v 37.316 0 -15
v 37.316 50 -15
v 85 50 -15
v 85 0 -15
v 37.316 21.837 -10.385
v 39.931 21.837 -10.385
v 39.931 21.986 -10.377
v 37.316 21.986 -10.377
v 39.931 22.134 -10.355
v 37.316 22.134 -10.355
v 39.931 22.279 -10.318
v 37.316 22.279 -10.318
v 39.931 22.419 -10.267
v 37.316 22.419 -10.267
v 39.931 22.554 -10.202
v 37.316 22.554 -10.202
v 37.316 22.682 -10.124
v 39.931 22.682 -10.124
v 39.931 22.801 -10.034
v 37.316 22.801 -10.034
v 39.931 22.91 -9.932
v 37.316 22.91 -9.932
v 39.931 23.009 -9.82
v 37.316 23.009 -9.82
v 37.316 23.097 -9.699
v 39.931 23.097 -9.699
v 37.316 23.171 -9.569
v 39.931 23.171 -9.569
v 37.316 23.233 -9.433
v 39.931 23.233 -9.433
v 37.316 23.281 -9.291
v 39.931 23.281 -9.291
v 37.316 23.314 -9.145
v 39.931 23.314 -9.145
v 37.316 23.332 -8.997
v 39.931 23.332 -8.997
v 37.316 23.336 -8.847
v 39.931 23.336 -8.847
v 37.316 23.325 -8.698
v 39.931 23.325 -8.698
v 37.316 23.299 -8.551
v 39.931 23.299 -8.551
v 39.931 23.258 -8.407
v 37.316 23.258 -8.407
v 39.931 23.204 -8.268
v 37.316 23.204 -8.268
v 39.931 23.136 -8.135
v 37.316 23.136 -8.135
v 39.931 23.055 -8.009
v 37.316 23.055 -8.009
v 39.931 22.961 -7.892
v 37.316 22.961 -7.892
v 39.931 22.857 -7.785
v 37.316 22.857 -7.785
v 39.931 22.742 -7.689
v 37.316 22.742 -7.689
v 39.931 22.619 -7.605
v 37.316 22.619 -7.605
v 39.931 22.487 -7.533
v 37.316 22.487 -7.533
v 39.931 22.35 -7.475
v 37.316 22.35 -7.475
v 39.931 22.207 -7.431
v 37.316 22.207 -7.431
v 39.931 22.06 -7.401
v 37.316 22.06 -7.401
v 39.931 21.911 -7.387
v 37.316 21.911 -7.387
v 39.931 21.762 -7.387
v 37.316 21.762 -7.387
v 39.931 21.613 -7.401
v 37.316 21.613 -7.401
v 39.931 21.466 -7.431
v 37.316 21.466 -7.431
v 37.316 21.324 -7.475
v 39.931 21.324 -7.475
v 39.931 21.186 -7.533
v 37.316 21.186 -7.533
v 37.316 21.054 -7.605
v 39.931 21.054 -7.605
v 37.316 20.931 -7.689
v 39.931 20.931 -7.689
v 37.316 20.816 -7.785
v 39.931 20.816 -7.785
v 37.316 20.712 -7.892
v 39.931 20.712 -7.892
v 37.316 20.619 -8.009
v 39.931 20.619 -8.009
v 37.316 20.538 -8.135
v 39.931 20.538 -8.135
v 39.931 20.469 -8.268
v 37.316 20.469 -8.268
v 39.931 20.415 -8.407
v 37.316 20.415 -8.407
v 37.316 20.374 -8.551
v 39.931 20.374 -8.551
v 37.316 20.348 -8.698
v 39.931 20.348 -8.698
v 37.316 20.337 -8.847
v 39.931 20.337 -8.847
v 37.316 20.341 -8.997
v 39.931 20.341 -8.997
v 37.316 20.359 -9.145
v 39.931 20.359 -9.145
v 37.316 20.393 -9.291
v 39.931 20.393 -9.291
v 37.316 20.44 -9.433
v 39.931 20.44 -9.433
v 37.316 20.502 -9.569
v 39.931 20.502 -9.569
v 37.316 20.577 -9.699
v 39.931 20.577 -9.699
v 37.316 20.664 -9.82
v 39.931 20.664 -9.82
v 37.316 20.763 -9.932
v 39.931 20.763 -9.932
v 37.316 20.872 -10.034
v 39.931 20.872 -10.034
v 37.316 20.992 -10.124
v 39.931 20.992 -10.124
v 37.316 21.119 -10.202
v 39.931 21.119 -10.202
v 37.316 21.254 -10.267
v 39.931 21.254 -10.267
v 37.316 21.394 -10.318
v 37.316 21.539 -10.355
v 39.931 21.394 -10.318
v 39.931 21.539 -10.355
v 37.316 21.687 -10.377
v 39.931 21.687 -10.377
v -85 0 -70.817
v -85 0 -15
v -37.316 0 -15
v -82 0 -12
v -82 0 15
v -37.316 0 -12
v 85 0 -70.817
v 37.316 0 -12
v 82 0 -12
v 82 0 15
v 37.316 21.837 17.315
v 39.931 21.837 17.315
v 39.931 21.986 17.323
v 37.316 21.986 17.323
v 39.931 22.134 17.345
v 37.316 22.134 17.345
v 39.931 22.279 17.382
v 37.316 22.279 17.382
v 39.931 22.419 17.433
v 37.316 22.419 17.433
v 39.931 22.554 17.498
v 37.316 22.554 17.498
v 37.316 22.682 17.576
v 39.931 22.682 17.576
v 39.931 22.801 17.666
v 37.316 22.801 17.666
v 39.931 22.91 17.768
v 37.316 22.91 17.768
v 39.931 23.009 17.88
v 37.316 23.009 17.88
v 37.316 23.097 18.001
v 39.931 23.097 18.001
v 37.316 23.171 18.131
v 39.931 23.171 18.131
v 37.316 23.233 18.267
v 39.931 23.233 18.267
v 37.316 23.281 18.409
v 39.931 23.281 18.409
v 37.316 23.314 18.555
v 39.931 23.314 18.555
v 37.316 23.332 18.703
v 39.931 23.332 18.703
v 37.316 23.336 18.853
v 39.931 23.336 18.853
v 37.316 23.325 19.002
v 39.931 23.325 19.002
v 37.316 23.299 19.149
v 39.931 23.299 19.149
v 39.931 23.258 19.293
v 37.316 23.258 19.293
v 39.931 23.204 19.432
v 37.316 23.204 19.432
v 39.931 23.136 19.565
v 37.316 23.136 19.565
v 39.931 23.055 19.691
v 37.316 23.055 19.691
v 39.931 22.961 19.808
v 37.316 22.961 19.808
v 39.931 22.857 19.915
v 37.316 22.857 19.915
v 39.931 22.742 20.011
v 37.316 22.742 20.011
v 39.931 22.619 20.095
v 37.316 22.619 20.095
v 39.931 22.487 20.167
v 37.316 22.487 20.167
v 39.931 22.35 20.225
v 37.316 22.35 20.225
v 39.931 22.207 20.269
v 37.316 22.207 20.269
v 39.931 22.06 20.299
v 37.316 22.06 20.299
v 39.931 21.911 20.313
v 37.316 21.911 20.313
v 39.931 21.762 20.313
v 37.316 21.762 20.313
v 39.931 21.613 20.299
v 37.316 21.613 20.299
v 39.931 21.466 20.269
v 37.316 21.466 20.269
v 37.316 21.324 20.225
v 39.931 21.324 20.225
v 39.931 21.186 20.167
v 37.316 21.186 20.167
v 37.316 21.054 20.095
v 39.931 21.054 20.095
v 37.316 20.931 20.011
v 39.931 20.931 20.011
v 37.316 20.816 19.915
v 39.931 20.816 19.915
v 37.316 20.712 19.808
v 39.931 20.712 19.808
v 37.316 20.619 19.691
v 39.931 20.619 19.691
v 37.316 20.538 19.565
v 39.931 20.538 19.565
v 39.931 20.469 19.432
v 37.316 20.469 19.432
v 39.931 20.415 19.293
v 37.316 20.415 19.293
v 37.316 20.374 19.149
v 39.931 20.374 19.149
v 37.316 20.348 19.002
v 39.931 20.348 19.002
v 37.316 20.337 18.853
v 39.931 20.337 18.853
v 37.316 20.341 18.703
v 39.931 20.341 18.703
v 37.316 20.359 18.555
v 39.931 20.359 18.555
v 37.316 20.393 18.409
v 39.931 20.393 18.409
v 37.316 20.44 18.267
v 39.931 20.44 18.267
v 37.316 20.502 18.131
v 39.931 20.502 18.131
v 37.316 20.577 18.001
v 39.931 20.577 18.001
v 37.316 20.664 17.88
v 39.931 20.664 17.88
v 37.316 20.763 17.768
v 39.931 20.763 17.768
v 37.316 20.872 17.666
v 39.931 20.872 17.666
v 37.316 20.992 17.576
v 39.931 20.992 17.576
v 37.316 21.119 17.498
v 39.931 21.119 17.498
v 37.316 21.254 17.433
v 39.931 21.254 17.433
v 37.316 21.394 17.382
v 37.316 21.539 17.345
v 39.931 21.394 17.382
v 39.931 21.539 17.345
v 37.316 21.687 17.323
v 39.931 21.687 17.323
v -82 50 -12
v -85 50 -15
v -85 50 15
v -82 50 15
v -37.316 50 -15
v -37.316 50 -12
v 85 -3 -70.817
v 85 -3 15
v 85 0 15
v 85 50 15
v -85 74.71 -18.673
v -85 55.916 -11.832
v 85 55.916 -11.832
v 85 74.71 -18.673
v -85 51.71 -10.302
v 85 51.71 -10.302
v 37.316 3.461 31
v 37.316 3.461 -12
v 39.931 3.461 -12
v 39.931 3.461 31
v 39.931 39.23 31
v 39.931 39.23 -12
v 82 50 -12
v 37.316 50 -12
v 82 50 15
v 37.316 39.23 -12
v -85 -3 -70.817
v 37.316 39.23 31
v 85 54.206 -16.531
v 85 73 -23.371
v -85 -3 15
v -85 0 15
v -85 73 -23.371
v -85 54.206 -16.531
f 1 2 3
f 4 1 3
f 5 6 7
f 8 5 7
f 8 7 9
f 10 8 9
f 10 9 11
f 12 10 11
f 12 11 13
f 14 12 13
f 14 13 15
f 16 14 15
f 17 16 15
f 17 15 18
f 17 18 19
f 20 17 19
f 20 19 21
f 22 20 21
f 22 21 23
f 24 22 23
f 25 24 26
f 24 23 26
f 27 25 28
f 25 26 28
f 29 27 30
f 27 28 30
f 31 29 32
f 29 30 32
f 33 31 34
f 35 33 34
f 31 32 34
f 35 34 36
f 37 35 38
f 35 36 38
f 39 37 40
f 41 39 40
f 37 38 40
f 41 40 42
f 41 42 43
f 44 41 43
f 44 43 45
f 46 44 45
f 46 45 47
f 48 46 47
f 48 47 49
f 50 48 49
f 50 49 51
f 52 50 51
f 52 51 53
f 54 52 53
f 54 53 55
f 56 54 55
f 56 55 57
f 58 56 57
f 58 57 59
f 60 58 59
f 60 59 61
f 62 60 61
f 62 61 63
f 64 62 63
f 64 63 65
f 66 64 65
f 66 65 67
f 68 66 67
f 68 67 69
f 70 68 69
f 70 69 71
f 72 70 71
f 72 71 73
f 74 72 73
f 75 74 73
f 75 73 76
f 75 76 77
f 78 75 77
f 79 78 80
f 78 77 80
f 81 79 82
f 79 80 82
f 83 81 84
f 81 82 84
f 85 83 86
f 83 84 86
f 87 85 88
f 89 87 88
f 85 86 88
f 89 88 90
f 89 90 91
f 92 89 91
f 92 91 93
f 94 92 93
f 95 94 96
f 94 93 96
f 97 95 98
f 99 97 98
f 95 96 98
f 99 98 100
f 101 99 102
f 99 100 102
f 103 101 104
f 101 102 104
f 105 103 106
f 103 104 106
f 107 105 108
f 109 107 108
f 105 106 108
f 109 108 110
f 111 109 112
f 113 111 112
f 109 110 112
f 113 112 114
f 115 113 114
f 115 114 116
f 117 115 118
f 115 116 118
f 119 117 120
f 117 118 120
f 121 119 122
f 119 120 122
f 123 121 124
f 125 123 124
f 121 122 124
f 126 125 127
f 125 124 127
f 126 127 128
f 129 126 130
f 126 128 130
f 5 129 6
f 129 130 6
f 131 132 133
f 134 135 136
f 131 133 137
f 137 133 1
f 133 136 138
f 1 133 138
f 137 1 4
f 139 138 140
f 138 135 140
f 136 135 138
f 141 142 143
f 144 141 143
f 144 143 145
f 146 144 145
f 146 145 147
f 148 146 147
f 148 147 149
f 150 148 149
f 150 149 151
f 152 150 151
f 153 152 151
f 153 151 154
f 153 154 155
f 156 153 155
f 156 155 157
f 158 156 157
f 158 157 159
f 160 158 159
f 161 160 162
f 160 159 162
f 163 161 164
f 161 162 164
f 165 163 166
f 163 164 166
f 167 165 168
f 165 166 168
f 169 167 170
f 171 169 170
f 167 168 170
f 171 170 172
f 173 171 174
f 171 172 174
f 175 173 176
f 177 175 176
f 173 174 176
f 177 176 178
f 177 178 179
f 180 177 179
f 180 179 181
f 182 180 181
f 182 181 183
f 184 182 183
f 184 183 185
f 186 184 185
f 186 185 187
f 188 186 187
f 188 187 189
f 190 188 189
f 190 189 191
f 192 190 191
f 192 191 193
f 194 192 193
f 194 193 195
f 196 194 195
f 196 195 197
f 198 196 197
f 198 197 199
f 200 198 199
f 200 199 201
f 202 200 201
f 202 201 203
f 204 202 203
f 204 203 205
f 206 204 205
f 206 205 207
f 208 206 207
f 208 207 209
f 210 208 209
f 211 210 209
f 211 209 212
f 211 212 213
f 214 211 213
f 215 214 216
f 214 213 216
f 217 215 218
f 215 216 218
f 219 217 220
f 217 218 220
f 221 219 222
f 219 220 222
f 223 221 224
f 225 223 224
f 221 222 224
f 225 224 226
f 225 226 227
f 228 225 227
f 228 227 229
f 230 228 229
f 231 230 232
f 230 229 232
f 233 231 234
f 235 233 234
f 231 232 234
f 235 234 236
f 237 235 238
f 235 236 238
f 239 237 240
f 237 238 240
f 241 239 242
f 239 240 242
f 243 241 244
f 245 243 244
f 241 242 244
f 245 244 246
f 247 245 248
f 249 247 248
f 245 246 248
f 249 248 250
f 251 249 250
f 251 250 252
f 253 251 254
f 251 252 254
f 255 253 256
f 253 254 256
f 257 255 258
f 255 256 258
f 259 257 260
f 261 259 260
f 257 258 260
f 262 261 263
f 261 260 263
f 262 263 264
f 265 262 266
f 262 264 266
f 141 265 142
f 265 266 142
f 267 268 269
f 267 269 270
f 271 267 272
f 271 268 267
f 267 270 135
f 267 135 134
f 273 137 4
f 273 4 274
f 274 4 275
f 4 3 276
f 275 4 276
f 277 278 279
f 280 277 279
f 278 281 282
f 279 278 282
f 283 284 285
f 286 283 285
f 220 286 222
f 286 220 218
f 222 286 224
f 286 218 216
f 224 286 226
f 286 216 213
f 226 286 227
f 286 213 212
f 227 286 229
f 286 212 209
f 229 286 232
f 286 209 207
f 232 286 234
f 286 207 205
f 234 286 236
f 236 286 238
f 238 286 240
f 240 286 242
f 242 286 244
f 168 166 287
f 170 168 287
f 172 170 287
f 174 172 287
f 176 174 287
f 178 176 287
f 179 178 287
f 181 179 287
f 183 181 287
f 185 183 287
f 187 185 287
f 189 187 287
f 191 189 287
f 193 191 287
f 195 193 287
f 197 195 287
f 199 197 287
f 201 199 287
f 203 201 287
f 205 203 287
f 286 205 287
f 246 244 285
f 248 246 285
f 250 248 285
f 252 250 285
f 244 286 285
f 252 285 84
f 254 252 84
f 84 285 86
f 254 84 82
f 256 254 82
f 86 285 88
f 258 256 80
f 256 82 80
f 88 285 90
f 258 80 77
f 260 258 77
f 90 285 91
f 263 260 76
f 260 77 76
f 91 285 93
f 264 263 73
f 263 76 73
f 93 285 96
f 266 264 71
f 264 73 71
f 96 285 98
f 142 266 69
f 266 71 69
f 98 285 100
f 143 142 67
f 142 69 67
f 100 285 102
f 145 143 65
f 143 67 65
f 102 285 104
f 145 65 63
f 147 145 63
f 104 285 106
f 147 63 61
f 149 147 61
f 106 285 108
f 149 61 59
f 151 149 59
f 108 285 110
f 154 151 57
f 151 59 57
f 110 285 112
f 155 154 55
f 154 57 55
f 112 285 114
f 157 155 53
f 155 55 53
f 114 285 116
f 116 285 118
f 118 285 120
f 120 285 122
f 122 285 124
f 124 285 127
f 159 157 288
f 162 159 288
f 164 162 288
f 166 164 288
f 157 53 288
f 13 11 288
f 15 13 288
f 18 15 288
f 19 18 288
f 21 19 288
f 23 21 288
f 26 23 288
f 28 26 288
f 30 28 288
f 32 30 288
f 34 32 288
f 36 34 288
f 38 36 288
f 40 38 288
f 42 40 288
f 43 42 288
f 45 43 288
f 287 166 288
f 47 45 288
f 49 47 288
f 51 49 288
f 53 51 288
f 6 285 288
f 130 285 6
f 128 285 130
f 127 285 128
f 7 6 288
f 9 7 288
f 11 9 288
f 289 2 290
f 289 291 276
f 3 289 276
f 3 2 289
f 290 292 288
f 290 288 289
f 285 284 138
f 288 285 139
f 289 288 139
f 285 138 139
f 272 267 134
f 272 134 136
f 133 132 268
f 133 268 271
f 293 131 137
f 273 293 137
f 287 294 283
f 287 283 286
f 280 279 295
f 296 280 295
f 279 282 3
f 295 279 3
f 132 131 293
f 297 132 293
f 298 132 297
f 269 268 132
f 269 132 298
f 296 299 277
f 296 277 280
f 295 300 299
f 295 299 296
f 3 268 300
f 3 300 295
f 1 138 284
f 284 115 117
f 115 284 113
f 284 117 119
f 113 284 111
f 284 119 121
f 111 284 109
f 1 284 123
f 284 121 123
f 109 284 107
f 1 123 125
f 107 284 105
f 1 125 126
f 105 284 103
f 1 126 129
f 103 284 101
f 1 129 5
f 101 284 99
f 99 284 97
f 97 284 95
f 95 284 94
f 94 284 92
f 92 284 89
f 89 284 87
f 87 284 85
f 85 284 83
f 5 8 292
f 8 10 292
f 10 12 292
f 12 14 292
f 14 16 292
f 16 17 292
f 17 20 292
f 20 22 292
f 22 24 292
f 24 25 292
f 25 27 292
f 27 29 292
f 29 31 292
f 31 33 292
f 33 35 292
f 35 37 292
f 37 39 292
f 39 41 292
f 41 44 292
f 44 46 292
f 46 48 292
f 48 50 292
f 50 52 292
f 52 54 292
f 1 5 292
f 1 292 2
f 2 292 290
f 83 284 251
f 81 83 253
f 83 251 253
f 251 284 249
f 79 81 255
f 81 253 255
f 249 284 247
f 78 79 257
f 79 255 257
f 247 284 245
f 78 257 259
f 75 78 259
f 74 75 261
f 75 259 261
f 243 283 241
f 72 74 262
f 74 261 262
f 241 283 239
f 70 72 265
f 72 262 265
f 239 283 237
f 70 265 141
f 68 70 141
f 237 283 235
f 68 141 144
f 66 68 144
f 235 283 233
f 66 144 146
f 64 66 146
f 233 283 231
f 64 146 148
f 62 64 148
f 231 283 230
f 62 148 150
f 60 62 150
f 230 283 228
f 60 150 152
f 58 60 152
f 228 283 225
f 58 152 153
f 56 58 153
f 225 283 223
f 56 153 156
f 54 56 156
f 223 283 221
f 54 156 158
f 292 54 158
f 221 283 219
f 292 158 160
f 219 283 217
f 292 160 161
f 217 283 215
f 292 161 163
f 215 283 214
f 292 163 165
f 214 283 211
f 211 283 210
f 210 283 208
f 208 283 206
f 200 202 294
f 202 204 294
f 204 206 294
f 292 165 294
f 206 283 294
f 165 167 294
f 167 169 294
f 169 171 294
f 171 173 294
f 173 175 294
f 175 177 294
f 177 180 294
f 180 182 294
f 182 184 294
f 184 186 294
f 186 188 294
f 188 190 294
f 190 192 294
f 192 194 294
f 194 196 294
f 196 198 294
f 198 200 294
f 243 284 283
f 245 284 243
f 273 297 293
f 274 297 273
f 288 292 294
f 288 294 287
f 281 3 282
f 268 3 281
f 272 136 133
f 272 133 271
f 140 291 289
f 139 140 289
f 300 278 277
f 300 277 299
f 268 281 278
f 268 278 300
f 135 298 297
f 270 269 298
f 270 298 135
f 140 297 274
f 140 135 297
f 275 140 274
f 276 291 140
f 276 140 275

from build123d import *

# Parameters (mm, degrees)
SKETCH_1_W          = 170
SKETCH_1_H          = 30
SKETCH_1_W_2        = 164
SKETCH_1_H_2        = 24
EXTRUDE_1_DEPTH     = 50
SKETCH_2_W          = 170
SKETCH_2_H          = 4.475871816
EXTRUDE_2_DEPTH     = 5
SKETCH_4_W          = 170
SKETCH_4_H          = 5
EXTRUDE_4_DEPTH     = 20
SKETCH_5_W          = 164
SKETCH_5_H          = 3
CUT_EXTRUDE_1_DEPTH = 51
SKETCH_6_W          = 170
SKETCH_6_H          = 85.817423509
EXTRUDE_5_DEPTH     = 3
SKETCH_7_W          = 74.63245353
SKETCH_7_H          = 50
CUT_EXTRUDE_2_DEPTH = 59.817423509
SKETCH_8_W          = 2.615260917
SKETCH_8_H          = 35.768956176
EXTRUDE_6_DEPTH     = 43
SKETCH_10_R         = 1.5
CUT_EXTRUDE_3_DEPTH = 13


with BuildPart() as part:
    # 草图1 → 凸台-拉伸1 (new body)
    with BuildSketch(Plane(origin=(0, 0, 0), x_dir=(1, 0, 0), z_dir=(0, 1, 0))):
        Rectangle(SKETCH_1_W, SKETCH_1_H)
        Rectangle(SKETCH_1_W_2, SKETCH_1_H_2, mode=Mode.SUBTRACT)
    extrude(amount=EXTRUDE_1_DEPTH)

    # 草图5 → 切除-拉伸1 (cut, through all)
    with BuildSketch(Plane(origin=(0, 50, 0), x_dir=(1, 0, 0), z_dir=(0, 1, 0))):
        with Locations((0, -13.5)):
            Rectangle(SKETCH_5_W, SKETCH_5_H)
    extrude(amount=-CUT_EXTRUDE_1_DEPTH, mode=Mode.SUBTRACT)

    # 草图6 → 凸台-拉伸5 (add)
    with BuildSketch(Plane.XZ):
        with Locations((0, -27.908711755)):
            Rectangle(SKETCH_6_W, SKETCH_6_H)
    extrude(amount=EXTRUDE_5_DEPTH)

    # 草图7 → 切除-拉伸2 (cut, through all)
    with BuildSketch(Plane.XY.offset(-12)):
        with Locations((0, 25)):
            Rectangle(SKETCH_7_W, SKETCH_7_H)
    extrude(amount=-CUT_EXTRUDE_2_DEPTH, mode=Mode.SUBTRACT)

    # 草图8 → 凸台-拉伸6 (add)
    with BuildSketch(Plane.XY.offset(-12)):
        with Locations((38.623857224, 21.345785944)):
            Rectangle(SKETCH_8_W, SKETCH_8_H)
    extrude(amount=EXTRUDE_6_DEPTH)

    # 草图10 → 切除-拉伸3 (cut)
    with BuildSketch(Plane(origin=(39.931487682, 0, 0), x_dir=(0, 0, -1), z_dir=(1, 0, 0))):
        with Locations((-18.815259496, 21.83659903)):
            Circle(SKETCH_10_R)
        with Locations((8.884740504, 21.83659903)):
            Circle(SKETCH_10_R)
    extrude(amount=-CUT_EXTRUDE_3_DEPTH, mode=Mode.SUBTRACT)


with BuildPart() as body_2:
    # 草图2 → 凸台-拉伸2 (new body)
    with BuildSketch(Plane(origin=(0, 1.027981849, 2.824356919), x_dir=(-1, 0, 0), z_dir=(0, 0.342020143, 0.939692621))):
        with Locations((0, -54.352869097)):
            Rectangle(SKETCH_2_W, SKETCH_2_H)
    extrude(amount=EXTRUDE_2_DEPTH)

    # 草图4 → 凸台-拉伸4 (add)
    with BuildSketch(Plane(origin=(0, 53.177961867, -19.355195239), x_dir=(1, 0, 0), z_dir=(0, 0.939692621, -0.342020143))):
        with Locations((0, -5.505617854)):
            Rectangle(SKETCH_4_W, SKETCH_4_H)
    extrude(amount=EXTRUDE_4_DEPTH)


solid = Compound([part.part, body_2.part])
